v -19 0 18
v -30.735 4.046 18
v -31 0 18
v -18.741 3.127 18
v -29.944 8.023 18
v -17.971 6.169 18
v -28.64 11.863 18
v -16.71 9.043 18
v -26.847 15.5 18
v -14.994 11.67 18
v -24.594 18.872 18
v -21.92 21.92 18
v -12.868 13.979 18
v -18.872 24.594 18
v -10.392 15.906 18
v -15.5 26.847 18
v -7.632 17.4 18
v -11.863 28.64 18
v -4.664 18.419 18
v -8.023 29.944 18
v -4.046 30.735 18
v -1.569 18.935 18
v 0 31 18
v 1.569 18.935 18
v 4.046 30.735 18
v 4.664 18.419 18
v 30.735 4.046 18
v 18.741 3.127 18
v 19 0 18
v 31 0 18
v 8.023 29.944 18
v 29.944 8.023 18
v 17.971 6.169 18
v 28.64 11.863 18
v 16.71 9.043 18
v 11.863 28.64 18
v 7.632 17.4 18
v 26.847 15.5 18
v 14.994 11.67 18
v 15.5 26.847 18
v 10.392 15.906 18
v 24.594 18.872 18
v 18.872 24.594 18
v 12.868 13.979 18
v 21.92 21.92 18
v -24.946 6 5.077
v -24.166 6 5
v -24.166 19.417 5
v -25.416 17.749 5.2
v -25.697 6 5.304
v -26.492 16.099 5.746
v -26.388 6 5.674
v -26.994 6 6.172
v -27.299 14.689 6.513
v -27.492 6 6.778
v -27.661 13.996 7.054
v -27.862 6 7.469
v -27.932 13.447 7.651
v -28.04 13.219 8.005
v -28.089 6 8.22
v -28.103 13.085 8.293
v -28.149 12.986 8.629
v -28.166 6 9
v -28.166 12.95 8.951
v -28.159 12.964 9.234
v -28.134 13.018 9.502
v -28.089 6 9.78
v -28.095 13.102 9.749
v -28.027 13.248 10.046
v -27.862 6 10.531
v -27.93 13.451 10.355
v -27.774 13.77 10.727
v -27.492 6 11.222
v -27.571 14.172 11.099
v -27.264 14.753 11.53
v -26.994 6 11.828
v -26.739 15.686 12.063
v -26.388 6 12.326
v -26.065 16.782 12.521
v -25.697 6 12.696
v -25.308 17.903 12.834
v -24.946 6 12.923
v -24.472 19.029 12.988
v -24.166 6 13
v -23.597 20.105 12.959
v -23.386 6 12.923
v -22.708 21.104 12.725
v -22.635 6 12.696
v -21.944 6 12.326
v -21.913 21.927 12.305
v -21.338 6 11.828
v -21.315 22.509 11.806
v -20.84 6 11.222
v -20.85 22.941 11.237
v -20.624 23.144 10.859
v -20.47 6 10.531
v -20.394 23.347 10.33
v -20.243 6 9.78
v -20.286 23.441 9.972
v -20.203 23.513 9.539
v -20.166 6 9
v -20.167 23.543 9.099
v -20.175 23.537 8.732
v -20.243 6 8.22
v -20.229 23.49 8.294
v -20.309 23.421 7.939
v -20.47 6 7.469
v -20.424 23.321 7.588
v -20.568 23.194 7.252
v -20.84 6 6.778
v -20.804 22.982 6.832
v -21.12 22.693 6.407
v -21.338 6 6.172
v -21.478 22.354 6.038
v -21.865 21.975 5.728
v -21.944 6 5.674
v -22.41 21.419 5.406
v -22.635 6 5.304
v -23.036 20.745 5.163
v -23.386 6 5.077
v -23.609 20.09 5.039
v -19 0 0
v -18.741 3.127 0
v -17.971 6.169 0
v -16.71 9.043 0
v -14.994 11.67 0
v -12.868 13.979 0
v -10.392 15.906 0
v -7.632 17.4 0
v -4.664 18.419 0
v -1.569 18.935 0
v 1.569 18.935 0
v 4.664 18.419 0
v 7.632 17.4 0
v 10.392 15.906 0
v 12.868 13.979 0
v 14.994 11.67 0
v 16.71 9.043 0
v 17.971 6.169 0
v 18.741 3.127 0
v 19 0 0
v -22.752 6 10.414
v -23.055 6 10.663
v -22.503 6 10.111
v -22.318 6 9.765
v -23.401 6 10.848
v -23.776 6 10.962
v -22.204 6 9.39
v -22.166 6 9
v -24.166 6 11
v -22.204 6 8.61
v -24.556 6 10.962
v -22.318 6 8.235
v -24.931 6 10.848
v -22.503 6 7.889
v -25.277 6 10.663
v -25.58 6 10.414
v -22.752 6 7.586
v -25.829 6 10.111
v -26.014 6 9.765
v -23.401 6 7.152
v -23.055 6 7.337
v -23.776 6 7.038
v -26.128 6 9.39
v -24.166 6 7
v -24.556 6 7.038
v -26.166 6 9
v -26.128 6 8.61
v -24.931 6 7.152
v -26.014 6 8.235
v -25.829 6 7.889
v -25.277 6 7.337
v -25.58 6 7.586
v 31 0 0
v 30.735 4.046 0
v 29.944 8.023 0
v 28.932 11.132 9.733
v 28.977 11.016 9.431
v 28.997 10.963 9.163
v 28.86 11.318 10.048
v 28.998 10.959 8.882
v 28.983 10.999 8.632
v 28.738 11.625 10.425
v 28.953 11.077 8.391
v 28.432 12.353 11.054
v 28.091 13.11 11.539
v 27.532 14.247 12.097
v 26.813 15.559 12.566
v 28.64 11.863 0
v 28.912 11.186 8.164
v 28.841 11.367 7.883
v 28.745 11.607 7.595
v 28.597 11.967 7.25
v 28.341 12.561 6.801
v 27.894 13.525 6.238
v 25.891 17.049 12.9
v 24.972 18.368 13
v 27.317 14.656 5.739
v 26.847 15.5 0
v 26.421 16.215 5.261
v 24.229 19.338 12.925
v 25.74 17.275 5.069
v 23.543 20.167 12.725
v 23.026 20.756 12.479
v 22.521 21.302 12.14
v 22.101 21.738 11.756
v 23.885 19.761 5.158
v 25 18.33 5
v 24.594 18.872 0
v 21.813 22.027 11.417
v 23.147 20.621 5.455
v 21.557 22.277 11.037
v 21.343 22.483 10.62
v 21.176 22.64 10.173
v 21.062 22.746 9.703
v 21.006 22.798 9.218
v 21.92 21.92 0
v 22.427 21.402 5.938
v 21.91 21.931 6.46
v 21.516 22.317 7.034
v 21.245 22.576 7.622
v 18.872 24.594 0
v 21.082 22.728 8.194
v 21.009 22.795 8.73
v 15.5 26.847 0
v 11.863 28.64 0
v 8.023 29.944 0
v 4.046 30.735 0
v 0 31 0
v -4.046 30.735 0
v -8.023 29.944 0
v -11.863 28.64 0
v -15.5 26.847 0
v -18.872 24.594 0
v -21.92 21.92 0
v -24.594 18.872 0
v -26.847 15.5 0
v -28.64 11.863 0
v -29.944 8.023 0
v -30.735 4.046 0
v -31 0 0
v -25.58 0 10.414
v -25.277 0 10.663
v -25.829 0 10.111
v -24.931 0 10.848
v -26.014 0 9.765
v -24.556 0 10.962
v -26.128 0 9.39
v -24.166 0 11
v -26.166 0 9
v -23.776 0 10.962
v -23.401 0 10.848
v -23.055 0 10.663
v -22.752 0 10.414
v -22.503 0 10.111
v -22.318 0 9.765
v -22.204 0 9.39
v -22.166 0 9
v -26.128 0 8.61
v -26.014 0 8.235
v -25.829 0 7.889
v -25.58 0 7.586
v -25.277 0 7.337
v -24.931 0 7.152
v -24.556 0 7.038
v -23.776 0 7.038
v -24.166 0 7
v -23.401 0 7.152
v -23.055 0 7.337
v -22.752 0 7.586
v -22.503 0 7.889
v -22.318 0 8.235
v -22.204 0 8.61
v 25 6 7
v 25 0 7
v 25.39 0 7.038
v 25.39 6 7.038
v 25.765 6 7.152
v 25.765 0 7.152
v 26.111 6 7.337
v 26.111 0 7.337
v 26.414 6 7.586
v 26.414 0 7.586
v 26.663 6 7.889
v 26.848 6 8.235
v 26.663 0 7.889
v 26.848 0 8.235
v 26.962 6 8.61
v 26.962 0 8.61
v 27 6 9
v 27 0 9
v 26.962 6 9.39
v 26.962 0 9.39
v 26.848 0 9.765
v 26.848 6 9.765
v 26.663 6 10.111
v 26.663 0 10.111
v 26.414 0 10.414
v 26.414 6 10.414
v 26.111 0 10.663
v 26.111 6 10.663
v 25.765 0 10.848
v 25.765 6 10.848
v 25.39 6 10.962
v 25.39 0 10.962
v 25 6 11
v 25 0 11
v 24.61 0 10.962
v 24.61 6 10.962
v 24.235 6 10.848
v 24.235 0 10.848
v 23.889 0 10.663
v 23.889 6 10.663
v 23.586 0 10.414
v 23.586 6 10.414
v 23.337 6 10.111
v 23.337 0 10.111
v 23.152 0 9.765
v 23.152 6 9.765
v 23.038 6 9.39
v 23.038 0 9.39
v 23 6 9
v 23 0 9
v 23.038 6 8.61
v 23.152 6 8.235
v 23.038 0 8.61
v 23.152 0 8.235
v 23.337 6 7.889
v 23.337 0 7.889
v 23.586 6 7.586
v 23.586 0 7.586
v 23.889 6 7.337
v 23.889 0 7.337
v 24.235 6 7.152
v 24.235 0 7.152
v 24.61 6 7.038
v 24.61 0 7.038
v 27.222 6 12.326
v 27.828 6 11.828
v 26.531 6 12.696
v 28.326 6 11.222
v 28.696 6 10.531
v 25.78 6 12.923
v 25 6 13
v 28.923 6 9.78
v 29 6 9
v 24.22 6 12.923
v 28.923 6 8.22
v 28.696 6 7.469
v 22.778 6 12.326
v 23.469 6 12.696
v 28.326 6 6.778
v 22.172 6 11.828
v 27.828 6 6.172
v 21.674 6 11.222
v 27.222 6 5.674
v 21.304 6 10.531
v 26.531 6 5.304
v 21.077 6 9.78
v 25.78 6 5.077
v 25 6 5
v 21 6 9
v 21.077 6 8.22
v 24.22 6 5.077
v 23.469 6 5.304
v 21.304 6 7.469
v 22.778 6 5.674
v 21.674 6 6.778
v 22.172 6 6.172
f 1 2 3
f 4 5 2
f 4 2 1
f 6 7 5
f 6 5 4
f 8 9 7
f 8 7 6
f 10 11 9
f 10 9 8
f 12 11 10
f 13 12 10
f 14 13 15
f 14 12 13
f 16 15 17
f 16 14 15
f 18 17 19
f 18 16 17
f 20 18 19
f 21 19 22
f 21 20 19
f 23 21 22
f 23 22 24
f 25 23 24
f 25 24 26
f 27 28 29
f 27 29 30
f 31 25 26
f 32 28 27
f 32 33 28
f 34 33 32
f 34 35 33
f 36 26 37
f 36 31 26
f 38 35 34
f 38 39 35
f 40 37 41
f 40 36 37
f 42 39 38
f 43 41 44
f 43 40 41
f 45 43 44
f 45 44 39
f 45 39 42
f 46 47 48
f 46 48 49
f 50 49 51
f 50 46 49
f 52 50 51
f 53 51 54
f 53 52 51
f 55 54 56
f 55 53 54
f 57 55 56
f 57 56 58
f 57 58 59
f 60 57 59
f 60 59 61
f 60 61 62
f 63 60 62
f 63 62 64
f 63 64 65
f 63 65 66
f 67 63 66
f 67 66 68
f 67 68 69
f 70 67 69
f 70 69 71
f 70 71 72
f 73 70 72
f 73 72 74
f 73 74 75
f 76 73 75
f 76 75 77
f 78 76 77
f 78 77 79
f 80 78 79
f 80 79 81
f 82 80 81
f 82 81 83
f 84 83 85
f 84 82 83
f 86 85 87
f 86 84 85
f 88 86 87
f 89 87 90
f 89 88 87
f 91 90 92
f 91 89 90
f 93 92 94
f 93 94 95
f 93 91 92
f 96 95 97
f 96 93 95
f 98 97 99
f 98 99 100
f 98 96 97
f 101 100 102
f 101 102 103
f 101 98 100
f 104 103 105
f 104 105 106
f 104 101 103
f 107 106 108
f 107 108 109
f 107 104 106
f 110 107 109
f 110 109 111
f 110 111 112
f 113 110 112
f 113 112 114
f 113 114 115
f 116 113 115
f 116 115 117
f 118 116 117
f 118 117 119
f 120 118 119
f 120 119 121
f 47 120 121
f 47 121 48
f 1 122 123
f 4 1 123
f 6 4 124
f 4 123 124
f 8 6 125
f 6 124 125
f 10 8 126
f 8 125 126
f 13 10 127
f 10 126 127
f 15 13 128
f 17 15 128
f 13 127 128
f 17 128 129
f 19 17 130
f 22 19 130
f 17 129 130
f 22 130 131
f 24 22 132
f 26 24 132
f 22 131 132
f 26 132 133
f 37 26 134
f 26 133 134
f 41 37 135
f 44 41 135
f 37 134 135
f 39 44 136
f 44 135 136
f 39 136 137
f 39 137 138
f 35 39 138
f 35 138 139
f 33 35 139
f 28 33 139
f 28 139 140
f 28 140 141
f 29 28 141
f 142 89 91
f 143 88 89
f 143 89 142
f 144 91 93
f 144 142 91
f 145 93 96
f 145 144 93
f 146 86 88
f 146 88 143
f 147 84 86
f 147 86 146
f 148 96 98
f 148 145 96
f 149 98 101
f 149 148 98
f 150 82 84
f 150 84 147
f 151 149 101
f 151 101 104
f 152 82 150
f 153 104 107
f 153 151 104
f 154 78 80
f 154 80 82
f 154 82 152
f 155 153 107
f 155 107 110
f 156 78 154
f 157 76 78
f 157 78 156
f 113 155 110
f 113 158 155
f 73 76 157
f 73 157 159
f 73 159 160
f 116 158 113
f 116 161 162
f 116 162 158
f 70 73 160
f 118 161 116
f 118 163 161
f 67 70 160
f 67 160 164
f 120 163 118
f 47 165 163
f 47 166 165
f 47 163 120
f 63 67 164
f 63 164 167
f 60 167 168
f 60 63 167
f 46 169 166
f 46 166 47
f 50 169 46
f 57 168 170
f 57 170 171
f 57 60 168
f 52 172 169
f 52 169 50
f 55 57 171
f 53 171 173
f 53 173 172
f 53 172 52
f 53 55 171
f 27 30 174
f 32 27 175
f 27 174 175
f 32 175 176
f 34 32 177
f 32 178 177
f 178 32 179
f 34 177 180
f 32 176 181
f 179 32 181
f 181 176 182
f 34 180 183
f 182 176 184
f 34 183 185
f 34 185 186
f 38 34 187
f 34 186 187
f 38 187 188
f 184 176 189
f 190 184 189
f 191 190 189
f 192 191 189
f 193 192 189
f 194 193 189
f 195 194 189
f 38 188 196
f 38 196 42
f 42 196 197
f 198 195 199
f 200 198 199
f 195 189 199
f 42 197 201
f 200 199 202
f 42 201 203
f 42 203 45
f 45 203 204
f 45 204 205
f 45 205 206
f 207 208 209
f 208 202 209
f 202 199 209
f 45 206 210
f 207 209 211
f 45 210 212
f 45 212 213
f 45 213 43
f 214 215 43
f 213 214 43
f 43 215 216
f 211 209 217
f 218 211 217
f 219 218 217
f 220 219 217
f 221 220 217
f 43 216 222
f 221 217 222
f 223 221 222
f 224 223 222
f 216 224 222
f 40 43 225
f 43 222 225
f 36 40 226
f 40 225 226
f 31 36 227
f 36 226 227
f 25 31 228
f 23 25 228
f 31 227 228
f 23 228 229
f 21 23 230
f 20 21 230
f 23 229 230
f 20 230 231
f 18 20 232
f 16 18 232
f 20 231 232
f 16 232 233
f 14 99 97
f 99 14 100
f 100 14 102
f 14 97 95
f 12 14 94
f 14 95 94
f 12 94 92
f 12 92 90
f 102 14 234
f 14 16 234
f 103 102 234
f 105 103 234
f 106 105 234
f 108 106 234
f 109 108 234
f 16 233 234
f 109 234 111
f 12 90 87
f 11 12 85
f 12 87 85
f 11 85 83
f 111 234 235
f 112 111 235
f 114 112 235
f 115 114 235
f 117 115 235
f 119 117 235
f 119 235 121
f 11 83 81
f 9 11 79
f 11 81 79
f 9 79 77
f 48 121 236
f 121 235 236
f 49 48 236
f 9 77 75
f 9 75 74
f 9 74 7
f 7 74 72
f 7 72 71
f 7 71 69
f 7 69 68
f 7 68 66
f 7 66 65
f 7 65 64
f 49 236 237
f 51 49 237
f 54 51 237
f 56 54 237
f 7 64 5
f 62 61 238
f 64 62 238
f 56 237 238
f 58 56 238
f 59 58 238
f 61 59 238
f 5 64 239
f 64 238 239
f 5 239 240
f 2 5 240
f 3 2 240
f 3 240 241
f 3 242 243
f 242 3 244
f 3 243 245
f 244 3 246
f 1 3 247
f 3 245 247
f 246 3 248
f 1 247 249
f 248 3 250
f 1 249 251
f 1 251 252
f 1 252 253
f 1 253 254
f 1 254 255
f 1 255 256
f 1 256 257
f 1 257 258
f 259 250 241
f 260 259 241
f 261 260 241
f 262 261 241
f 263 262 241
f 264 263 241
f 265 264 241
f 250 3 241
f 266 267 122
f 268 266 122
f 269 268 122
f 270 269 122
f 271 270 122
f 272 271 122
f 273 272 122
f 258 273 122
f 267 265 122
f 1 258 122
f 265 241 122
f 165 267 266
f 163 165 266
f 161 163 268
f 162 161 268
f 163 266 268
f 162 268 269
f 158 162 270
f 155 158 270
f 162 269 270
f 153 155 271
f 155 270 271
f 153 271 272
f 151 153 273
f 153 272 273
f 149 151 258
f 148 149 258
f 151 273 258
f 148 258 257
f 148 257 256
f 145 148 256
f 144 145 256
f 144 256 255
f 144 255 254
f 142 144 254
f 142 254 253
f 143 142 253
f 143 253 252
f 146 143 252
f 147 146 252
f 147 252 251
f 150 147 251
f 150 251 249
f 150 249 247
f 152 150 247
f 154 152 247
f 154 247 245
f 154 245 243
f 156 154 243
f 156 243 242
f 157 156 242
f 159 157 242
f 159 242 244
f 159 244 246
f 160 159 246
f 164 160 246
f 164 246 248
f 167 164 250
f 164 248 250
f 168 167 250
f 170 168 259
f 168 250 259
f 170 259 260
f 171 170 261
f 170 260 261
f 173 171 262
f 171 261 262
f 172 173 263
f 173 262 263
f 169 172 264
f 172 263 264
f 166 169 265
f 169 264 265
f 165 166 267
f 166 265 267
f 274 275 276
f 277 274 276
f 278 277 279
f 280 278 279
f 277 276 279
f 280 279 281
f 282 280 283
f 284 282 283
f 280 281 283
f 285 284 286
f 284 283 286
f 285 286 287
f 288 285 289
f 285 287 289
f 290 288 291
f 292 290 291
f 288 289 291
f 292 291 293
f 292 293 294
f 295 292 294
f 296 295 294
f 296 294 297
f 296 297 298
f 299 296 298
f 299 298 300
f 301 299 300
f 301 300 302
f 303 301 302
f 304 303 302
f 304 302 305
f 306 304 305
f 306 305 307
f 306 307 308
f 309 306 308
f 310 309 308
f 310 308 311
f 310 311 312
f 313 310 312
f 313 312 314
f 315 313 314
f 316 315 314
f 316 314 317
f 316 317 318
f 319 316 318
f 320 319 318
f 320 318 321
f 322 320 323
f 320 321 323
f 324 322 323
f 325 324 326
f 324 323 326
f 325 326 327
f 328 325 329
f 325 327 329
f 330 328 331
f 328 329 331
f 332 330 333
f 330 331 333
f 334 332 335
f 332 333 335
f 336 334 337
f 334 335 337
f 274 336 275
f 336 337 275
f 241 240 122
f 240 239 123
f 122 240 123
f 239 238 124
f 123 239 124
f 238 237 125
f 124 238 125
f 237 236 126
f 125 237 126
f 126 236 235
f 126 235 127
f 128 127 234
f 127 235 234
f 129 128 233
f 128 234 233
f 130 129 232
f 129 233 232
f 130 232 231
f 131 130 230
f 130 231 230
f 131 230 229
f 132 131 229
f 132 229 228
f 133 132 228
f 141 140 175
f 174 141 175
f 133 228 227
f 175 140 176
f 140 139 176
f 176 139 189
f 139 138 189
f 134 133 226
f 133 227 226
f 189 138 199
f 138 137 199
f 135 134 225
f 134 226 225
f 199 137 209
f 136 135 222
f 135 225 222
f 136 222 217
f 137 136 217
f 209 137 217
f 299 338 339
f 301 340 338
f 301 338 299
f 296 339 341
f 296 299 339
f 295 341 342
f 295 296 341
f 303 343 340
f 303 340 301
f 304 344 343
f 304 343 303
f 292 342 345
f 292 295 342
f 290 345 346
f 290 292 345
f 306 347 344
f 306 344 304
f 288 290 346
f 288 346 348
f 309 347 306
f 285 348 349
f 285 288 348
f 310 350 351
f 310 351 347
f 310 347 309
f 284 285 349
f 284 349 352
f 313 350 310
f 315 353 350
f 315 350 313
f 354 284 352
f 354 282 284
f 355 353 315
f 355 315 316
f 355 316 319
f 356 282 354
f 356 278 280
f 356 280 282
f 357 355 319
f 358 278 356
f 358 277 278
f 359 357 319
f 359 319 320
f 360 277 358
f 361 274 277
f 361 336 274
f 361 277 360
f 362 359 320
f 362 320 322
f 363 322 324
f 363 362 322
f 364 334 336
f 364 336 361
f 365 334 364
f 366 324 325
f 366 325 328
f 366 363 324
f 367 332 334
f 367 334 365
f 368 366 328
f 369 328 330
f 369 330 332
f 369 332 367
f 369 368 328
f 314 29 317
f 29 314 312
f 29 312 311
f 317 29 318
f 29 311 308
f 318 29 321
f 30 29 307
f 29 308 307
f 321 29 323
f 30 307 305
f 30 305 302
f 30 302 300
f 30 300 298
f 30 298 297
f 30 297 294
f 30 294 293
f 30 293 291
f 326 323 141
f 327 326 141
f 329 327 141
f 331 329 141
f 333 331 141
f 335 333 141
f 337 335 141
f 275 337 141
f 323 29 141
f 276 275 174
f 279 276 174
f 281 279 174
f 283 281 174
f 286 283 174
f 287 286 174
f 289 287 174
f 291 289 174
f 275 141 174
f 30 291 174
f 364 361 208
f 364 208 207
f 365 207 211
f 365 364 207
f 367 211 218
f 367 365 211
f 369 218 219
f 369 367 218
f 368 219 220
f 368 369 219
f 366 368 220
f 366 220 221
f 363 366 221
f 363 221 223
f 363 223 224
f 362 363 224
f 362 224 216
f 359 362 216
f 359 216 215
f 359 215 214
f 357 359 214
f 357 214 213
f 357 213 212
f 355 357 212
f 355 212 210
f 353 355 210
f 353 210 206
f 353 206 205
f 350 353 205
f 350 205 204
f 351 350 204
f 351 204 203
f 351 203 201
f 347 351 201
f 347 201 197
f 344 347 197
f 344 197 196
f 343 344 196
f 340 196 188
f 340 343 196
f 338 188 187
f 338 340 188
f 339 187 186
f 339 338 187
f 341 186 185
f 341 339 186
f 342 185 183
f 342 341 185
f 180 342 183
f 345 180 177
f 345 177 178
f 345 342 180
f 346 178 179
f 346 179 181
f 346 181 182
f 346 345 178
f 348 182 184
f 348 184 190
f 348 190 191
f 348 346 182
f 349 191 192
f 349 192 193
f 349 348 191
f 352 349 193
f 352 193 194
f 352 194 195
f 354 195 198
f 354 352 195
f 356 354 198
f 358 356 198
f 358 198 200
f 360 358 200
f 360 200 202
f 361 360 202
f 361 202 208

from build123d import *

# Parameters (mm, degrees)
BOSS_EXTRUDE1_DEPTH = 18
SKETCH2_R           = 2
CUT_EXTRUDE1_DEPTH  = 48.391982444
SKETCH3_R           = 4
CUT_EXTRUDE2_DEPTH  = 44.703546936


with BuildPart() as part:
    # Sketch1 → Boss-Extrude1 (new body)
    with BuildSketch(Plane.XY):
        with BuildLine():
            Line((-31, 0), (-19, 0))
            ThreePointArc((-19, 0), (0, 19), (19, 0))
            Line((19, 0), (31, 0))
            ThreePointArc((31, 0), (0, 31), (-31, 0))
        make_face()
    extrude(amount=BOSS_EXTRUDE1_DEPTH)

    # Sketch2 → Cut-Extrude1 (cut, through all)
    with BuildSketch(Plane.XZ):
        with Locations(Location((-24.165982166, 9, 0), (0, 0, 270))):
            Circle(SKETCH2_R)
        with Locations(Location((25, 9, 0), (0, 0, 270))):
            Circle(SKETCH2_R)
    extrude(amount=-CUT_EXTRUDE1_DEPTH, mode=Mode.SUBTRACT)

    # Sketch3 → Cut-Extrude2 (cut, through all)
    with BuildSketch(Plane(origin=(0, 6, 0), x_dir=(1, 0, 0), z_dir=(0, 1, 0))):
        with Locations(Location((-24.165982166, -9, 0), (0, 0, 90))):
            Circle(SKETCH3_R)
        with Locations(Location((25, -9, 0), (0, 0, 90))):
            Circle(SKETCH3_R)
    extrude(amount=CUT_EXTRUDE2_DEPTH, mode=Mode.SUBTRACT)


solid = part.part
